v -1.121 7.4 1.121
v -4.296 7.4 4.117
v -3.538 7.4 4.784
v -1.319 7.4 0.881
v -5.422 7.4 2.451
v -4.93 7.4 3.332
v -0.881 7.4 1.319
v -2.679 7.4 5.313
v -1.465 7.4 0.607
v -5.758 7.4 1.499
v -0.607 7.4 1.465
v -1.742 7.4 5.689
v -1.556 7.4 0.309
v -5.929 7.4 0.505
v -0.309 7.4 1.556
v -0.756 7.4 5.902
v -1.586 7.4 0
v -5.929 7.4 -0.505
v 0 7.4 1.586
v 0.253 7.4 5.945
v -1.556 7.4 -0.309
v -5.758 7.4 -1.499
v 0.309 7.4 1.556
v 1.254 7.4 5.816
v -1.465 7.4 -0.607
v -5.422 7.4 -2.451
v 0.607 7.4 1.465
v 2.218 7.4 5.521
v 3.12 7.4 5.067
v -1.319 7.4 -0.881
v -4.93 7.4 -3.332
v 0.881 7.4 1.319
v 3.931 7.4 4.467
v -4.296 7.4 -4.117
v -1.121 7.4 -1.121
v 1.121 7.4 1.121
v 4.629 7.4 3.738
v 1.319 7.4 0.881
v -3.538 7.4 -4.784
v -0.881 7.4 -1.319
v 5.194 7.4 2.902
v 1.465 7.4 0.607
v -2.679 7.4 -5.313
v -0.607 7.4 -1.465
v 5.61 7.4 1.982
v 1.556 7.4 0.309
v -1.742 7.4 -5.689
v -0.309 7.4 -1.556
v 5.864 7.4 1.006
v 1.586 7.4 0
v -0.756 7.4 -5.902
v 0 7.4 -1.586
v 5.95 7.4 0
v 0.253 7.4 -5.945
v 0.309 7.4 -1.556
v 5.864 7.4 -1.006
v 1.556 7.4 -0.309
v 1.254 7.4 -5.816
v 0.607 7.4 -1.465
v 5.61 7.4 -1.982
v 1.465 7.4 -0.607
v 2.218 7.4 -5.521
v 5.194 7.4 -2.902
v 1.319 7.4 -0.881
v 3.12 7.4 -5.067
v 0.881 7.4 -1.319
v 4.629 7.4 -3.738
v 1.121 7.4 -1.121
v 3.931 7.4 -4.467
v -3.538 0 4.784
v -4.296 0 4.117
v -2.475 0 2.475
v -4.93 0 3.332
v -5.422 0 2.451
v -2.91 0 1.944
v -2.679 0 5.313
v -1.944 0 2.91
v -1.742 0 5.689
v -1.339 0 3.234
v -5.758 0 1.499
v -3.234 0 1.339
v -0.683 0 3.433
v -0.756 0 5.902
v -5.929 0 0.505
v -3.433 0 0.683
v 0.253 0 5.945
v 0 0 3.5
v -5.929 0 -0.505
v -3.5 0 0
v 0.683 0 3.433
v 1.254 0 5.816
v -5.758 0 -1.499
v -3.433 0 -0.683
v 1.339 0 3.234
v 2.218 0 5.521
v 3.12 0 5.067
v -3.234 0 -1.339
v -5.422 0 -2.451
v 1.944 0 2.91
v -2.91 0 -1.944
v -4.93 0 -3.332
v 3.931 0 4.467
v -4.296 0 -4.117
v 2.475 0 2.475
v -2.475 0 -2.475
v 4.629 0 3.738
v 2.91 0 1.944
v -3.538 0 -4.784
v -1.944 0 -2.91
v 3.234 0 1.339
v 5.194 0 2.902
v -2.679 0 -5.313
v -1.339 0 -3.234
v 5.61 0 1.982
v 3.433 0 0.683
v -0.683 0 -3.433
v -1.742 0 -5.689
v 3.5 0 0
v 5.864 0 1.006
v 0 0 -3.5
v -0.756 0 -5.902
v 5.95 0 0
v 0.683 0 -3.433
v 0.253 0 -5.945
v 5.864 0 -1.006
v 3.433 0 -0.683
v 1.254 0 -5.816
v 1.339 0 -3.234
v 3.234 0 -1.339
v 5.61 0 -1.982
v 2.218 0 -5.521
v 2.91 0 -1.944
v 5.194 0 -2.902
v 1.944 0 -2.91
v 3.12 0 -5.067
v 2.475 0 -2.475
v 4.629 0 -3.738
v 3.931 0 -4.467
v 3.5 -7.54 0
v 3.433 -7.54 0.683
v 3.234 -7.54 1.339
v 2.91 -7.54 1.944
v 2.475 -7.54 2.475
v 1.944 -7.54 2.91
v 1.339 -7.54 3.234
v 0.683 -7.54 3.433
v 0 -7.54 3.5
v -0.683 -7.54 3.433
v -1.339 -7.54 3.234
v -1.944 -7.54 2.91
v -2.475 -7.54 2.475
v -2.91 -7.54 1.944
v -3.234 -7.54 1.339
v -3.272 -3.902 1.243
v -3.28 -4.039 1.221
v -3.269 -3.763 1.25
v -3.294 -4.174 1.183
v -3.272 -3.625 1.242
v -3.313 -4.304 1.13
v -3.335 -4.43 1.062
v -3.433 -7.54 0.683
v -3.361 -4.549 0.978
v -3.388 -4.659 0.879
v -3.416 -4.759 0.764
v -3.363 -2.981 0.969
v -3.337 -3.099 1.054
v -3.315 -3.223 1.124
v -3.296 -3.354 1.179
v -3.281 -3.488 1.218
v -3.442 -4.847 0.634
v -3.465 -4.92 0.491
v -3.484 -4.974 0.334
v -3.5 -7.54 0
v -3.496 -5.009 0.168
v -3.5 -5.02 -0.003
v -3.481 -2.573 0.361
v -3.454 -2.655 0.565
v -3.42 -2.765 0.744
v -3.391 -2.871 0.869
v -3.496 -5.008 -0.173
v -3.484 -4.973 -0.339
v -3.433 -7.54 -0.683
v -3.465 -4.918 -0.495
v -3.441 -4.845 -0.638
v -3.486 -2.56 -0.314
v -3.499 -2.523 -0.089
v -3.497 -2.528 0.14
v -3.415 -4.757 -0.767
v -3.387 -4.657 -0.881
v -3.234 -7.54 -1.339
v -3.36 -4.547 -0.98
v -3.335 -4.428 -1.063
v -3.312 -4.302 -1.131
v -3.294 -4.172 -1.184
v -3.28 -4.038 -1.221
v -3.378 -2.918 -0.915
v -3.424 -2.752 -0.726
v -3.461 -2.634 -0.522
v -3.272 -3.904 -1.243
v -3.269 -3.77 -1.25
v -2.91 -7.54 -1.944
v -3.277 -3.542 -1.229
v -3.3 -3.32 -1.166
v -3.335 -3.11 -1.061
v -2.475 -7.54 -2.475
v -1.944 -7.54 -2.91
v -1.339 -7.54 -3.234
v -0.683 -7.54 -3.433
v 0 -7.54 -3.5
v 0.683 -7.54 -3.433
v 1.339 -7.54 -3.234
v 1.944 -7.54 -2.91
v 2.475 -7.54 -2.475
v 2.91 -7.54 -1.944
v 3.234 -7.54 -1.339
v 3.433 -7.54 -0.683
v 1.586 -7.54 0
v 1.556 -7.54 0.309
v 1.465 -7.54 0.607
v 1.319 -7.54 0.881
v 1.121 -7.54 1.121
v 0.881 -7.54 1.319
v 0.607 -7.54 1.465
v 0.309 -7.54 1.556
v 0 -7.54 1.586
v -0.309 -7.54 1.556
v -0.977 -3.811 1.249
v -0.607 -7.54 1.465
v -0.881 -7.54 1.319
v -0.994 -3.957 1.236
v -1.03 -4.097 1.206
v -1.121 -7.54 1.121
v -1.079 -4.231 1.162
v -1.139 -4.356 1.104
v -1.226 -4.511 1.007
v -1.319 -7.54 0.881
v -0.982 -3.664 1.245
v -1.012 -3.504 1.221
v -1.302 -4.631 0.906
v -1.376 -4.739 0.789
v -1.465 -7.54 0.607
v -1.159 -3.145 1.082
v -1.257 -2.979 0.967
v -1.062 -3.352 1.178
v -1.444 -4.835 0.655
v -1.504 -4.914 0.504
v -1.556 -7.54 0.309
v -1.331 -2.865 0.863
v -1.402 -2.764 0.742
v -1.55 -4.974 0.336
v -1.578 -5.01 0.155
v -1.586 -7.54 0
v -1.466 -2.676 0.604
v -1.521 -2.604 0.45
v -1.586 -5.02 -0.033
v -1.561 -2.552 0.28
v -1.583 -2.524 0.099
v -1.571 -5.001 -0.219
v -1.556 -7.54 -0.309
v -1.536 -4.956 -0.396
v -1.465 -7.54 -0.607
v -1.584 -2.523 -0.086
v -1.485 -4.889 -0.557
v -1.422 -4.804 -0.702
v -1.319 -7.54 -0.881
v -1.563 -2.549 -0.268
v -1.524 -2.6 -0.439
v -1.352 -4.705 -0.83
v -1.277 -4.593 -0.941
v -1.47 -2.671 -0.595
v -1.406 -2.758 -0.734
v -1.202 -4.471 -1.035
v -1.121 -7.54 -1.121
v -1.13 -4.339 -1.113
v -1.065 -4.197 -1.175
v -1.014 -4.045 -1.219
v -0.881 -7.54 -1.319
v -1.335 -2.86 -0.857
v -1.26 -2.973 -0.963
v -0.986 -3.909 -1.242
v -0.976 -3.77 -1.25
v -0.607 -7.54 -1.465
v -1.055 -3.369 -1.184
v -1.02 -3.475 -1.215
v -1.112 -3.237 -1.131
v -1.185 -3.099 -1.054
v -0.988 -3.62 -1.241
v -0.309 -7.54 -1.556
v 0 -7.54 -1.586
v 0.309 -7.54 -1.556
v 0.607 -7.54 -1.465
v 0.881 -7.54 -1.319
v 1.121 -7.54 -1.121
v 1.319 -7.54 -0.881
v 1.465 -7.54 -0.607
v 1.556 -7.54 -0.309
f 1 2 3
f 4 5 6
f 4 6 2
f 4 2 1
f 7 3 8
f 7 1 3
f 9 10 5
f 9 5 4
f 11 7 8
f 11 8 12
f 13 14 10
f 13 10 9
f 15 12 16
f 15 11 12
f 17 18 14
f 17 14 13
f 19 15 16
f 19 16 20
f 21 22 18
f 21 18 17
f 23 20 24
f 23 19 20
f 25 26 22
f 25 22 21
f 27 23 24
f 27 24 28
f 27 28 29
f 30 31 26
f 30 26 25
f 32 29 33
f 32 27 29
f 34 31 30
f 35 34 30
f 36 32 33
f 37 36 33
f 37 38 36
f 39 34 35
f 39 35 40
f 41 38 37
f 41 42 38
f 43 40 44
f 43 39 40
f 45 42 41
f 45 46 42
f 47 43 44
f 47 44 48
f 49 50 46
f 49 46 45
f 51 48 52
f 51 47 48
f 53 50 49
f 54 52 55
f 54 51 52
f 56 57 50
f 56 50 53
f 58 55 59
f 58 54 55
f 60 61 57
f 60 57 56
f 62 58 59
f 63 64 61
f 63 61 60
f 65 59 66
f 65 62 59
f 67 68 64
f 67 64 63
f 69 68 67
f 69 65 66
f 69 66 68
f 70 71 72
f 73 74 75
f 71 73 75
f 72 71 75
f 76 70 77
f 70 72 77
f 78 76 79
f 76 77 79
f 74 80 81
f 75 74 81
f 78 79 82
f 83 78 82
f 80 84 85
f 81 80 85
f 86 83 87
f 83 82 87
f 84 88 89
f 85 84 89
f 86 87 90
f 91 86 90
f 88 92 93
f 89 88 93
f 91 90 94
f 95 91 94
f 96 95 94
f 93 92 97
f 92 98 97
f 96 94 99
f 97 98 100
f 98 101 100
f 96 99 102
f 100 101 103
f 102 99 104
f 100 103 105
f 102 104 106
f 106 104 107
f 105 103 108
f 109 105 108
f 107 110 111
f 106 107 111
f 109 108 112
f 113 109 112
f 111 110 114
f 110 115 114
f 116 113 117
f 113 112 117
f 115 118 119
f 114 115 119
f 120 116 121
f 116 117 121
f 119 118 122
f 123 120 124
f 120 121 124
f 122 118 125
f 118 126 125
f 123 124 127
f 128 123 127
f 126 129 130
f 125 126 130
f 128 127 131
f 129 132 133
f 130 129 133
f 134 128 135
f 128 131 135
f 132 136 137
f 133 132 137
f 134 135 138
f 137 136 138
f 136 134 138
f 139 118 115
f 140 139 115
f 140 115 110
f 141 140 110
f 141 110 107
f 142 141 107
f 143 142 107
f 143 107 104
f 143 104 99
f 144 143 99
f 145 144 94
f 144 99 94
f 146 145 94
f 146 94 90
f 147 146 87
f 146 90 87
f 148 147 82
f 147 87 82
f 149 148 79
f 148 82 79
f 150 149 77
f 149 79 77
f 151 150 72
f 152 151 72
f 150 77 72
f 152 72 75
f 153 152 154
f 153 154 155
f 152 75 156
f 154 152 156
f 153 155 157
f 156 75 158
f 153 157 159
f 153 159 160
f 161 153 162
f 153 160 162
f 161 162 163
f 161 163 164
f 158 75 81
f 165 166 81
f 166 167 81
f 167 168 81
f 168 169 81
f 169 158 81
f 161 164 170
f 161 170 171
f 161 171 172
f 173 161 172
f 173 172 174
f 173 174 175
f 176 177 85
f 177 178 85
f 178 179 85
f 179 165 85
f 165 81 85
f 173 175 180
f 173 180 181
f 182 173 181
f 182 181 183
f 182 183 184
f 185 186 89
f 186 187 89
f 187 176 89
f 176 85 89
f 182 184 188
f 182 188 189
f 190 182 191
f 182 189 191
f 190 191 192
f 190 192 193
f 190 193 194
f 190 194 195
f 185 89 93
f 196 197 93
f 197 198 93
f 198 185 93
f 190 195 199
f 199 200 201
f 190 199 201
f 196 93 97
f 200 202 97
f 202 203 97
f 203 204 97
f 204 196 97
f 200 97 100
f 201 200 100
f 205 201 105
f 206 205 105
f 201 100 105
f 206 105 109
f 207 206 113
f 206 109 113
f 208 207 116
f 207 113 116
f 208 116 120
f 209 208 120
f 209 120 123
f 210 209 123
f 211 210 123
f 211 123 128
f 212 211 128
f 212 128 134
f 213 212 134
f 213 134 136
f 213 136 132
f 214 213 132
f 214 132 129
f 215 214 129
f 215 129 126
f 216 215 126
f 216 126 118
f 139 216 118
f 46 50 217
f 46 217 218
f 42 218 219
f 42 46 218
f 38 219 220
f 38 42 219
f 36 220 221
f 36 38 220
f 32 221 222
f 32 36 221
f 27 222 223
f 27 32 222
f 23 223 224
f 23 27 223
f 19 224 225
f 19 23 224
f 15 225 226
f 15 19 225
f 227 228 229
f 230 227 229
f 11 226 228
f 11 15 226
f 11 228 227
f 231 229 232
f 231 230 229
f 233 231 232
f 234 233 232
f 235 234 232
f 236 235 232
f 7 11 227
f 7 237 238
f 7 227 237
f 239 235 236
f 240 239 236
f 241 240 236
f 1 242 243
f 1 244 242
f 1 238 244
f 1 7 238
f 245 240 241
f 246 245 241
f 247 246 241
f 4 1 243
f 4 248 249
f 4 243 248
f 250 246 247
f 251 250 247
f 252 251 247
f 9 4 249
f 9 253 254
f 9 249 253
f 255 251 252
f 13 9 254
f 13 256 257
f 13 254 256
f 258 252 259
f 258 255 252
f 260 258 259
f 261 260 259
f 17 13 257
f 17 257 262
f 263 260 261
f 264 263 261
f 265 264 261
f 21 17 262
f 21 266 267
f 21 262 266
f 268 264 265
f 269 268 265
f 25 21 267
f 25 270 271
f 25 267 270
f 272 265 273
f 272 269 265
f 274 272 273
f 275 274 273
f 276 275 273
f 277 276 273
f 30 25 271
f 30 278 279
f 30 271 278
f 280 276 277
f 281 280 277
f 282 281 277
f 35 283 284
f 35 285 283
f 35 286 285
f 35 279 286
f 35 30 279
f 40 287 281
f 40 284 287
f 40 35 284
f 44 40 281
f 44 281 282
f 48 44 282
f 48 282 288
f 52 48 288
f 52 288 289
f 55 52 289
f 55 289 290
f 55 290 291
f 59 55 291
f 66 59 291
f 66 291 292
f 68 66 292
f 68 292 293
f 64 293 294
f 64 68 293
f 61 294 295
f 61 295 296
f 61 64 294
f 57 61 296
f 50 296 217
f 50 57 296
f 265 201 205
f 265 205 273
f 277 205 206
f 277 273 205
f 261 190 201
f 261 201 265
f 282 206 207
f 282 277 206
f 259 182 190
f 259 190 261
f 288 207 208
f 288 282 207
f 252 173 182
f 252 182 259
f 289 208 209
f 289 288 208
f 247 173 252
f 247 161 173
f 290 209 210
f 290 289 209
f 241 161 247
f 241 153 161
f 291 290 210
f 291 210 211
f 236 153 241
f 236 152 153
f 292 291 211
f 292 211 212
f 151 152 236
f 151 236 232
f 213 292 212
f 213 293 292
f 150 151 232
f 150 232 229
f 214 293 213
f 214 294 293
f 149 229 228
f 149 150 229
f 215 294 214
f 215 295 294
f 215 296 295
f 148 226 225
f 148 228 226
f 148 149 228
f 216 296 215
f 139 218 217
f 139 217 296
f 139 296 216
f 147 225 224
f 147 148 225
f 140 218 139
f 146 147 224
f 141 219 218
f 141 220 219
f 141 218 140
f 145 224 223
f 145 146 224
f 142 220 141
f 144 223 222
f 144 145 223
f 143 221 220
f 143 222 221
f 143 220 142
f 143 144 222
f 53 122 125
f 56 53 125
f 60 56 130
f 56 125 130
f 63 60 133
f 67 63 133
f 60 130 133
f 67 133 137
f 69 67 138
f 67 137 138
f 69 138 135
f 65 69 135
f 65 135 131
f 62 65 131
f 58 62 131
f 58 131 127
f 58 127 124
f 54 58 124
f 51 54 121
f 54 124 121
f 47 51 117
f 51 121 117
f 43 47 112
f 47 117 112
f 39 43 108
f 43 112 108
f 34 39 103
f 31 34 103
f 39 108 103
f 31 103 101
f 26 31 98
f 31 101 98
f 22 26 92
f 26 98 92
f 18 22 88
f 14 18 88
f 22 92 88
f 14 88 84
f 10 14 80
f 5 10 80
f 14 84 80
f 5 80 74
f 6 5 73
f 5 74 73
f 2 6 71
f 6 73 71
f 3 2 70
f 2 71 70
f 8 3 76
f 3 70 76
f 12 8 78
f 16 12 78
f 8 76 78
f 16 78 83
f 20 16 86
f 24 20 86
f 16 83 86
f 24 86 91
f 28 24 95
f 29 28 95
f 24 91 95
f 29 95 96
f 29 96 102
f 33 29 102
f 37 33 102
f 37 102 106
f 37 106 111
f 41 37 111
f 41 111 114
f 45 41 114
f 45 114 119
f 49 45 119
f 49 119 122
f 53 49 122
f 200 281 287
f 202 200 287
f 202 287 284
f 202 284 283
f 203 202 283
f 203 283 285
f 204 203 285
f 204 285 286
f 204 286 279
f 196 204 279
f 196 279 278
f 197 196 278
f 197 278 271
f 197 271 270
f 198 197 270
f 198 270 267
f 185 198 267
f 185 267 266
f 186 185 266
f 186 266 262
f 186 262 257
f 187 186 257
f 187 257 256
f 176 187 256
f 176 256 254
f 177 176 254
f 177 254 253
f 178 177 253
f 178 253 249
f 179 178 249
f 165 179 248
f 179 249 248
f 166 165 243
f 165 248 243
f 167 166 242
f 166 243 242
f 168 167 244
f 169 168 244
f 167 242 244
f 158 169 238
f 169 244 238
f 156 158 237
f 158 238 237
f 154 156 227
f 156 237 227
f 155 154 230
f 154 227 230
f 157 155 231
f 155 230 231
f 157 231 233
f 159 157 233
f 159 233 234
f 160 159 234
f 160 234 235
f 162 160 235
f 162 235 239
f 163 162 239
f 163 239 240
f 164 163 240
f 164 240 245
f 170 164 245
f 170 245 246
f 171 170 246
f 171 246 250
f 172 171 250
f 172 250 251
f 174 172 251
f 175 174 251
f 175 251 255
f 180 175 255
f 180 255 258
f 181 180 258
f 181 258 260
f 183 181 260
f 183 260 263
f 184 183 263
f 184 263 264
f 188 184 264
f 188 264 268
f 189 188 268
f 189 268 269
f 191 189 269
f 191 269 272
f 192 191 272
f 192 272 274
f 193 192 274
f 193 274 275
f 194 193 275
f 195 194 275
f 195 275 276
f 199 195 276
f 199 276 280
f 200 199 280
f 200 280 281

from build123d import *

# Parameters (mm, degrees)
SKETCH1_R           = 5.95
SKETCH1_R_2         = 1.586
BOSS_EXTRUDE1_DEPTH = 7.4
SKETCH2_R           = 3.5
SKETCH2_R_2         = 1.586
BOSS_EXTRUDE2_DEPTH = 7.54
SKETCH3_R           = 1.25
CUT_EXTRUDE1_DEPTH  = 10


with BuildPart() as part:
    # Sketch1 → Boss-Extrude1 (new body)
    with BuildSketch(Plane(origin=(0, 0, 0), x_dir=(1, 0, 0), z_dir=(0, 1, 0))):
        Circle(SKETCH1_R)
        Circle(SKETCH1_R_2, mode=Mode.SUBTRACT)
    extrude(amount=BOSS_EXTRUDE1_DEPTH)

    # Sketch2 → Boss-Extrude2 (add)
    with BuildSketch(Plane.XZ):
        Circle(SKETCH2_R)
        Circle(SKETCH2_R_2, mode=Mode.SUBTRACT)
    extrude(amount=BOSS_EXTRUDE2_DEPTH)

    # Sketch3 → Cut-Extrude1 (cut)
    with BuildSketch(Plane(origin=(0, 0, 0), x_dir=(0, 0, -1), z_dir=(1, 0, 0))):
        with Locations((0, -3.77)):
            Circle(SKETCH3_R)
    extrude(amount=-CUT_EXTRUDE1_DEPTH, mode=Mode.SUBTRACT)


solid = part.part
